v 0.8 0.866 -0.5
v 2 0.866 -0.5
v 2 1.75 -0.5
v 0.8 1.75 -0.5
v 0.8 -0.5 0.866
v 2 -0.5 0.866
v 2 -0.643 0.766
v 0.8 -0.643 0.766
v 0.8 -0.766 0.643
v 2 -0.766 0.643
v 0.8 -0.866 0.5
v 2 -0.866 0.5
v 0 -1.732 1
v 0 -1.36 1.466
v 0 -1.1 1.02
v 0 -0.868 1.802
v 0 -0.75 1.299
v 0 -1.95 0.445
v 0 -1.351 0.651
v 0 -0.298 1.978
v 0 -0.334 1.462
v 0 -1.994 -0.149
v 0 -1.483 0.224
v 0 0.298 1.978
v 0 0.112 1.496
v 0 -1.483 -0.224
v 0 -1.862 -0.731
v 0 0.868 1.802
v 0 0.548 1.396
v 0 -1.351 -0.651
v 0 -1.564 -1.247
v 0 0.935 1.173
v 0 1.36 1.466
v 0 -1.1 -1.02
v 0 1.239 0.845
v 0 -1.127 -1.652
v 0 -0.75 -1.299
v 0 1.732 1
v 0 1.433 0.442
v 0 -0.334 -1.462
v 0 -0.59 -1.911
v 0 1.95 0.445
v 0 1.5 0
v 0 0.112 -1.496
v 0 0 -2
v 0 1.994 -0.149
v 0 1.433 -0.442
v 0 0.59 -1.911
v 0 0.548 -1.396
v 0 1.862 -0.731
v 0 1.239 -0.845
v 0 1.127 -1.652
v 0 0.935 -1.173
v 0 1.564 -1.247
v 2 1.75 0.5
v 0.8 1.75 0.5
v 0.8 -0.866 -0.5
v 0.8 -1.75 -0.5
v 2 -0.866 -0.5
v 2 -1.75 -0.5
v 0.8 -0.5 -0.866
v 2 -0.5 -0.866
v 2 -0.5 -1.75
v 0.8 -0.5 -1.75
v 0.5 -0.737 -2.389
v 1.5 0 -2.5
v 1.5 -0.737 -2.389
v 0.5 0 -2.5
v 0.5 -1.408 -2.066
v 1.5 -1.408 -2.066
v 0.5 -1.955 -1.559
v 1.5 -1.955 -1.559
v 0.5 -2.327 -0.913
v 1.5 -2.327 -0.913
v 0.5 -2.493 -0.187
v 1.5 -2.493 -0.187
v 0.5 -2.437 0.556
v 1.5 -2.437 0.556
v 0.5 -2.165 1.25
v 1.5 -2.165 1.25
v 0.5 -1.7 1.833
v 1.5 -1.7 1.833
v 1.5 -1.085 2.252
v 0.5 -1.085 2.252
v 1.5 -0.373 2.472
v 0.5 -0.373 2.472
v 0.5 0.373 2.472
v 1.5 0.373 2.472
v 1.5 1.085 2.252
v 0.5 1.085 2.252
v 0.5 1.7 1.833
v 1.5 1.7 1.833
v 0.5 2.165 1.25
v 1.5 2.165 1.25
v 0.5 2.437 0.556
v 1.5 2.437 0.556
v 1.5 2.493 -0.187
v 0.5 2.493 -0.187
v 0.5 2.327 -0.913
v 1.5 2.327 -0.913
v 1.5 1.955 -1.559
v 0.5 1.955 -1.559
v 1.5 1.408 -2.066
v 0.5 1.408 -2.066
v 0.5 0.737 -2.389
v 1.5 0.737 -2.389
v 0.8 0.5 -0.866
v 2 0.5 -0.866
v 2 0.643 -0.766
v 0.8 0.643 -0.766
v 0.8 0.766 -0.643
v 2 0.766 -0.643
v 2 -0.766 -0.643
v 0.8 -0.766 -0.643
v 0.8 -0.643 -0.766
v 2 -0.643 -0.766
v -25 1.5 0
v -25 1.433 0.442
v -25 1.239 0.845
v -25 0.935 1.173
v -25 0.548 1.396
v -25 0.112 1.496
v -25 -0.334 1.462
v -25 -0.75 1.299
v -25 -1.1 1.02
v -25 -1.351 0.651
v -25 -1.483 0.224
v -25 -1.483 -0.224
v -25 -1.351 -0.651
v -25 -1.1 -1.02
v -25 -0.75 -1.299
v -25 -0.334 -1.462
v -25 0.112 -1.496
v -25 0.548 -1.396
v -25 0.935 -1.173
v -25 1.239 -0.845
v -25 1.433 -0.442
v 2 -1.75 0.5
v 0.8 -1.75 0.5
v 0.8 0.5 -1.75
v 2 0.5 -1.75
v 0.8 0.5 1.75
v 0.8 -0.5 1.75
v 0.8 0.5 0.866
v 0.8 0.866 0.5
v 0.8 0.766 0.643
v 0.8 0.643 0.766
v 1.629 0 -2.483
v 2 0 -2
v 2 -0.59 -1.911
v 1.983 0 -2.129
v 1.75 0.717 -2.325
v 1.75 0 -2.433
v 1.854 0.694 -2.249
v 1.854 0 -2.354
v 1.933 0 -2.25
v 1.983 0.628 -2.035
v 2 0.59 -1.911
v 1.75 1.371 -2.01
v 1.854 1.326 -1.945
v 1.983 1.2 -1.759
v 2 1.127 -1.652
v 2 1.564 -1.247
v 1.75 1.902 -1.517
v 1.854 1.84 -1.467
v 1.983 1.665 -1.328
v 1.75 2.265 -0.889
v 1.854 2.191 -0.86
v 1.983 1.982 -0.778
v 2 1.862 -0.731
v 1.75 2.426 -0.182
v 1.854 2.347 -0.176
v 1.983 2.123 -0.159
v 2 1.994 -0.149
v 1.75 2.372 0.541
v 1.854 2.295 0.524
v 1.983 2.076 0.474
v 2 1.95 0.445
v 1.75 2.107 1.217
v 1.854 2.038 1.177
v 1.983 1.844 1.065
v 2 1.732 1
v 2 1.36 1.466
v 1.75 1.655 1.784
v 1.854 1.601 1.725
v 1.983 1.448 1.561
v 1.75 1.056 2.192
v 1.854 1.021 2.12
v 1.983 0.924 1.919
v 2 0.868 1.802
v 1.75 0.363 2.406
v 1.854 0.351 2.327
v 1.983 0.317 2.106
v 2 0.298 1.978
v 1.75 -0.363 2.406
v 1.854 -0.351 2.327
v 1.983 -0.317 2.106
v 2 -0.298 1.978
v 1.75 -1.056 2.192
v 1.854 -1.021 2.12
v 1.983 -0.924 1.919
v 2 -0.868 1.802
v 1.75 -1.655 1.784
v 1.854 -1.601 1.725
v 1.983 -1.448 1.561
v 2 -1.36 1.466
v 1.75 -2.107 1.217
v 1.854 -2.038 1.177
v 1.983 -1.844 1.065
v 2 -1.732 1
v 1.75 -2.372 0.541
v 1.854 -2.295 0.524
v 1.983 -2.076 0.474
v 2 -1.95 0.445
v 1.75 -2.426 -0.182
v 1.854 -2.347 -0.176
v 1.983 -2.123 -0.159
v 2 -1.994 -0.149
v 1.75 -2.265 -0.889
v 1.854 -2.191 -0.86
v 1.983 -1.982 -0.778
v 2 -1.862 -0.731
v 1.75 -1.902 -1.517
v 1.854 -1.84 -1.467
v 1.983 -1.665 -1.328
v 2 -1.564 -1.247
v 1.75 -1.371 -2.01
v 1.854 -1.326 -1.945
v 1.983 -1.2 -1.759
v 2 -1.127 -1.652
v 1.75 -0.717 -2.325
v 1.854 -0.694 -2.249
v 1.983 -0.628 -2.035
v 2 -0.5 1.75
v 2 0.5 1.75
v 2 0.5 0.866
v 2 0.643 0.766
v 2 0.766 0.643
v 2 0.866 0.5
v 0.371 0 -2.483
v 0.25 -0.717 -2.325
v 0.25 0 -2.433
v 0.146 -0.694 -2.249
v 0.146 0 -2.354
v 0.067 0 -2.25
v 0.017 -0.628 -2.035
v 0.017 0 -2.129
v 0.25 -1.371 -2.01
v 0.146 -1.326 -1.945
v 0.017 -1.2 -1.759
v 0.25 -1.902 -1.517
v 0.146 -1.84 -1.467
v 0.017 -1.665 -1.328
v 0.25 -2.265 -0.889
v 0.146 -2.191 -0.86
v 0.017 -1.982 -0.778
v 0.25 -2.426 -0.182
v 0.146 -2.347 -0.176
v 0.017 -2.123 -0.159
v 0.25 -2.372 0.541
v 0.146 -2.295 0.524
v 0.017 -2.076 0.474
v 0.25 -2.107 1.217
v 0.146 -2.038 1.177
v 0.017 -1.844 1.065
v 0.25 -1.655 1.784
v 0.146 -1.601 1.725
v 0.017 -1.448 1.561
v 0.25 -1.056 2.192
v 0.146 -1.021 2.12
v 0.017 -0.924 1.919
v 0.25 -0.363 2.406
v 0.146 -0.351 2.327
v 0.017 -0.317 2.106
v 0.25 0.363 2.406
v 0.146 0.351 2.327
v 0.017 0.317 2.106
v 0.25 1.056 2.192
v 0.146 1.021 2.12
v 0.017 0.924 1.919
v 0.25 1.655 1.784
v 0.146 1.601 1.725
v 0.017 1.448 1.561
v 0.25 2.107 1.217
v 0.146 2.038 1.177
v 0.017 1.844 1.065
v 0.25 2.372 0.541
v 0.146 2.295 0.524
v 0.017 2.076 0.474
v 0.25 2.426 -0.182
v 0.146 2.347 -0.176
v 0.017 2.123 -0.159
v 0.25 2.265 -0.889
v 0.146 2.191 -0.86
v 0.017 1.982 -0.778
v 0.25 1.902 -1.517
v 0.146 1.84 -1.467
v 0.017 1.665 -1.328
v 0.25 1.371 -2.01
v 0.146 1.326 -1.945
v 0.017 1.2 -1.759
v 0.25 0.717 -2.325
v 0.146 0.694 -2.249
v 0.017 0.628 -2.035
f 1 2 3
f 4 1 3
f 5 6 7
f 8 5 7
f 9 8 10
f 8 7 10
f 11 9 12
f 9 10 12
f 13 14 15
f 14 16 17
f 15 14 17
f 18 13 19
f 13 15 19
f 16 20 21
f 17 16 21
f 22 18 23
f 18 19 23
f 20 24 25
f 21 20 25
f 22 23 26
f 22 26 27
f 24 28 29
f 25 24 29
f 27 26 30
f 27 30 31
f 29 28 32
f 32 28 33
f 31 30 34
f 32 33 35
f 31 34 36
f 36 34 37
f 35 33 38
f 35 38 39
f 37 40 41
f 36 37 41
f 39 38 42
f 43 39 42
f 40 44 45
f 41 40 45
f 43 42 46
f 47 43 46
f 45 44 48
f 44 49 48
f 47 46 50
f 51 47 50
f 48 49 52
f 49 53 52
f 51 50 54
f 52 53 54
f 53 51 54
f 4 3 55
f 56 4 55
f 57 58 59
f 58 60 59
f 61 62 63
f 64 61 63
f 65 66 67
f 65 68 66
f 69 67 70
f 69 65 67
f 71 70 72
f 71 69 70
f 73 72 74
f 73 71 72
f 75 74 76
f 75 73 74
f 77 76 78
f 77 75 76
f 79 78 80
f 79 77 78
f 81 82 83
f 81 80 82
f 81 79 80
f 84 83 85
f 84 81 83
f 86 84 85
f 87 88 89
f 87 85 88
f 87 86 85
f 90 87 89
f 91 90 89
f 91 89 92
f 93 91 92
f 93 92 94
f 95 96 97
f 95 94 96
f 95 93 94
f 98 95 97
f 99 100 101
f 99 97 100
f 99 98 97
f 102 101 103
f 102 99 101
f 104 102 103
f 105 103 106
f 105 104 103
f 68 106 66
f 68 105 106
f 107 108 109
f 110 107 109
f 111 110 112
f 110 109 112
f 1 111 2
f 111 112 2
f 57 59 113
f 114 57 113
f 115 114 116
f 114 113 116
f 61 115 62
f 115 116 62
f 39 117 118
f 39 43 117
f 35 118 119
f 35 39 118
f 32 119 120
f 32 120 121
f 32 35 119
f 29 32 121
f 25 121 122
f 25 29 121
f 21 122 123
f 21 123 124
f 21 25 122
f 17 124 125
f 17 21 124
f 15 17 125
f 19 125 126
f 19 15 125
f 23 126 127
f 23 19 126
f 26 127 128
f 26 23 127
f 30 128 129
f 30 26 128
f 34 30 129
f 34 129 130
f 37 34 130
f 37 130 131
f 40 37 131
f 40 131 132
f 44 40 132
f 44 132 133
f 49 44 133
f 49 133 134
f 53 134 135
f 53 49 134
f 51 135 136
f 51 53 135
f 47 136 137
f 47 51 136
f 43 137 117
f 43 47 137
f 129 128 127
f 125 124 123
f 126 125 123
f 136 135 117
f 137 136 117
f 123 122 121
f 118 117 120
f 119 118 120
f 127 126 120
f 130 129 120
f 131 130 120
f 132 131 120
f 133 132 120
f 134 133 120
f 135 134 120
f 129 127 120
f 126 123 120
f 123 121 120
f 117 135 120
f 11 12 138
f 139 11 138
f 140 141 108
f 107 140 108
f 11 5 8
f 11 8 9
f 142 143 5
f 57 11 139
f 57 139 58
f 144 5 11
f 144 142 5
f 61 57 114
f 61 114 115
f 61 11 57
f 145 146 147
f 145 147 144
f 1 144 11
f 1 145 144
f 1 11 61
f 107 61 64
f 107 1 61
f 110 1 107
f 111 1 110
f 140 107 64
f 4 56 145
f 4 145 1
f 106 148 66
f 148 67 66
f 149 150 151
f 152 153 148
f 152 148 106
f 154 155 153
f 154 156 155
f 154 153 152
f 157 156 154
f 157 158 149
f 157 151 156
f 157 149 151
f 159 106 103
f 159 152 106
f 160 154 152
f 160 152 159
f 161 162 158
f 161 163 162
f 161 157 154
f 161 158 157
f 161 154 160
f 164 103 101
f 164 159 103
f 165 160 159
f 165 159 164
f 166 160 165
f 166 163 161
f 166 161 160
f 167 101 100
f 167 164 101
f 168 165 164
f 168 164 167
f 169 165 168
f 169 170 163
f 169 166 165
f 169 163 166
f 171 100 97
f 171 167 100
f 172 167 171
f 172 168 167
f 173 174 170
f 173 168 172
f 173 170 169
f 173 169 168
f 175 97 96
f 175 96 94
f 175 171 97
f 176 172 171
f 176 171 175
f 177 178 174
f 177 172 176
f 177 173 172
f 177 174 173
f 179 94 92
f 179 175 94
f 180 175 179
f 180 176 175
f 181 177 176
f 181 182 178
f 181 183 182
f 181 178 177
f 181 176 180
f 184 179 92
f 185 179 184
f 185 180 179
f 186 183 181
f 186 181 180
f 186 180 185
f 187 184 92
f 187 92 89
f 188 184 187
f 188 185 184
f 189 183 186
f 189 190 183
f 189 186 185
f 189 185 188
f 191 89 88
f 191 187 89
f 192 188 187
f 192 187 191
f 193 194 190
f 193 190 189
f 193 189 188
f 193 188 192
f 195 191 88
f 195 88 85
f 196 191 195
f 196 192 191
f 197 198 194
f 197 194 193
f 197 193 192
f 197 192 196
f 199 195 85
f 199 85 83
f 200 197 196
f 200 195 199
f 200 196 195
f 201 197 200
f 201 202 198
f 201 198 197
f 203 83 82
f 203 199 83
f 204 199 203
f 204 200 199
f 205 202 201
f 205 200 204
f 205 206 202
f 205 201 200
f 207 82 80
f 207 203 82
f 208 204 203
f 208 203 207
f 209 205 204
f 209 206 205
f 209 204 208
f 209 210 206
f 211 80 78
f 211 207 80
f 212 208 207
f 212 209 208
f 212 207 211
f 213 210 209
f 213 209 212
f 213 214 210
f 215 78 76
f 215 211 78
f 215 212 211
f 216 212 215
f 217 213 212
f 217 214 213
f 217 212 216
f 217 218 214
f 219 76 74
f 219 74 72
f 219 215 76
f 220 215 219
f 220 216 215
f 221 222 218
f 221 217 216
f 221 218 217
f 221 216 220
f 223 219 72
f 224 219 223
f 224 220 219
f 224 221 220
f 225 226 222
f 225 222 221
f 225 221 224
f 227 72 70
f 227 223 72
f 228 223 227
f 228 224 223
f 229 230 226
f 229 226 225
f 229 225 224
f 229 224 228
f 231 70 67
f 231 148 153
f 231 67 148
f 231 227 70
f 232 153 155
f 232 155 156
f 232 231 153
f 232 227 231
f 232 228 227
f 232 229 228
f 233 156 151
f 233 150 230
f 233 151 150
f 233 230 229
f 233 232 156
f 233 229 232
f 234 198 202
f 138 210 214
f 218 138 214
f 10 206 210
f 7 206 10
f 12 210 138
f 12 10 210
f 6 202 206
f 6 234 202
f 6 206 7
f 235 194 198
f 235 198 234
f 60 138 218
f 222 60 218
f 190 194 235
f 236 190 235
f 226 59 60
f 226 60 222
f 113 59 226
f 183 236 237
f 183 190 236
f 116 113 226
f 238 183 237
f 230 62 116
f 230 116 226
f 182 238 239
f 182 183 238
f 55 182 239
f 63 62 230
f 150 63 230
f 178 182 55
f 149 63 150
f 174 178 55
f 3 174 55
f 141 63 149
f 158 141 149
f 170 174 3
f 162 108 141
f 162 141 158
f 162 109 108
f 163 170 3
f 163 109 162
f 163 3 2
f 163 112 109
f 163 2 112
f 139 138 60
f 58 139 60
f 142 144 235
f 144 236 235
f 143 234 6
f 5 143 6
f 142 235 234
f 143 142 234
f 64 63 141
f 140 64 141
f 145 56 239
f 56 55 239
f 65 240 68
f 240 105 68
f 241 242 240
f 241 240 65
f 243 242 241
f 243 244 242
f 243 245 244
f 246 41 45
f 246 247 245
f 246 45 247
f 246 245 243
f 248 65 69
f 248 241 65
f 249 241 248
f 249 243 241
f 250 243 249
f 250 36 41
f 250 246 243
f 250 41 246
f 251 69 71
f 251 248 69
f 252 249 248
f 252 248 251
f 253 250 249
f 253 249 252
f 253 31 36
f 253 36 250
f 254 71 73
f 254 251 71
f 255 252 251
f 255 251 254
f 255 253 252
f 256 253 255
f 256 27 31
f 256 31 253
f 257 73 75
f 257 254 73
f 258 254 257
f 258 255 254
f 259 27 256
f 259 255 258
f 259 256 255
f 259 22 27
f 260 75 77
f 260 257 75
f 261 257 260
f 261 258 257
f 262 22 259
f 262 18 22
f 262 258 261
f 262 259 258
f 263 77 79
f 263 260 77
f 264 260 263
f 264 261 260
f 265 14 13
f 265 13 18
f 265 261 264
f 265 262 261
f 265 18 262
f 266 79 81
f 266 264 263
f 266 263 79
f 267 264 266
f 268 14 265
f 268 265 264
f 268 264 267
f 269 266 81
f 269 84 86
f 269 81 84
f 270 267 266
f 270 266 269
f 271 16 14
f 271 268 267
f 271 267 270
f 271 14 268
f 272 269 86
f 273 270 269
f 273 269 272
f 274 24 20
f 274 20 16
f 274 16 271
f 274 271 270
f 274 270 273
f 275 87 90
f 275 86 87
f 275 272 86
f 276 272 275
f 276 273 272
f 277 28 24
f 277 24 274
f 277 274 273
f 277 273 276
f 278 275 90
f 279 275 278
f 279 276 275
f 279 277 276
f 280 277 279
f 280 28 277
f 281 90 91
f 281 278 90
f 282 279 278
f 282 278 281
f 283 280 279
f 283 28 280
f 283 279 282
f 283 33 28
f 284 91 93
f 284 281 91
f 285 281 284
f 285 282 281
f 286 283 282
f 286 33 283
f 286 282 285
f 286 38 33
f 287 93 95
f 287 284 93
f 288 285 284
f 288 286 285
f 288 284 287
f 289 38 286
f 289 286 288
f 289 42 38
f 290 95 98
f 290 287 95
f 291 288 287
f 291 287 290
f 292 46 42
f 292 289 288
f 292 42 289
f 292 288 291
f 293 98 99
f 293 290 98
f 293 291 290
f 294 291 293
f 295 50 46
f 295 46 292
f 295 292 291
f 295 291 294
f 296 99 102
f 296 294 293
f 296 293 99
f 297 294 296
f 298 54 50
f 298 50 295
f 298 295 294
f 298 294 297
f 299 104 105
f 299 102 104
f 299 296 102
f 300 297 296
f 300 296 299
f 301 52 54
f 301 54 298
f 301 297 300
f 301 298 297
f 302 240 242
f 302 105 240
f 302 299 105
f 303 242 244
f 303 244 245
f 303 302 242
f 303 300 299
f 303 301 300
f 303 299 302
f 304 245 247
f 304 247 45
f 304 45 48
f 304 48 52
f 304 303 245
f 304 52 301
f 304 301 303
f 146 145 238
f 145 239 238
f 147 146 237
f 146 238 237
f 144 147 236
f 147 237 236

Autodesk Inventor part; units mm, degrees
ref_plane "YZ Plane" through (0, 0, 0) normal (1, 0, 0) x (0, 1, 0)
ref_plane "XZ Plane" through (0, 0, 0) normal (0, 1, 0) x (-1, 0, 0)
ref_plane "XY Plane" through (0, 0, 0) normal (0, 0, 1) x (1, 0, 0)
sketch "Sketch1" plane through (0, 0, 0) normal (1, 0, 0) x (0, 1, 0)
  circle A0 centre (0, 0) radius 1.5
  dimension "d0" = 3
extrude "Extrusion1" add sketch "Sketch1" against normal blind 25
sketch "Sketch2" plane through (0, 0, 0) normal (1, 0, 0) x (0, 0, -1)
  circle A0 centre (0, 0) radius 2.5
  dimension "d3" = 5
extrude "Extrusion2" add sketch "Sketch2" along normal blind 2
fillet "Fillet1" radius 0.5 2 edges at (0, 0, 2.5) (2, 0, 2.5)
sketch "Sketch3" plane through (2, 0, 0) normal (1, 0, 0) x (0, 0, -1)
  line L0 (1.75, -0.5) -> (1.75, 0.5)
  line L1 (-1.75, 0.5) -> (-1.75, -0.5)
  line L2 (0.5, 1.75) -> (-0.5, 1.75)
  line L3 (-0.5, -1.75) -> (0.5, -1.75)
  line L4 (-0.5, 1.75) -> (-0.5, 0.866)
  line L5 (-0.5, -0.866) -> (-0.5, -1.75)
  line L6 (-1.75, -0.5) -> (-0.866, -0.5)
  line L7 (0.866, -0.5) -> (1.75, -0.5)
  line L8 (1.75, 0.5) -> (0.866, 0.5)
  line L9 (-0.866, 0.5) -> (-1.75, 0.5)
  line L10 (0.5, -1.75) -> (0.5, -0.866)
  line L11 (0.5, 0.866) -> (0.5, 1.75)
  arc A0 (-0.5, 0.866) -> (-0.866, 0.5) centre (0, 0) ccw
  arc A1 (-0.866, -0.5) -> (-0.5, -0.866) centre (0, 0) ccw
  arc A2 (0.5, -0.866) -> (0.866, -0.5) centre (0, 0) ccw
  arc A3 (0.866, 0.5) -> (0.5, 0.866) centre (0, 0) ccw
  dimension "d7" = 3.5
  dimension "d8" = 1
  dimension "d9" = 3.5
  dimension "d10" = 1
extrude "Extrusion3" cut sketch "Sketch3" against normal blind 1.2
thread "Thread1" size "M3x0.35" class "6g" standard "ANSI Metric M Profile" full length
properties part number "Parafuso lateral do captador"
